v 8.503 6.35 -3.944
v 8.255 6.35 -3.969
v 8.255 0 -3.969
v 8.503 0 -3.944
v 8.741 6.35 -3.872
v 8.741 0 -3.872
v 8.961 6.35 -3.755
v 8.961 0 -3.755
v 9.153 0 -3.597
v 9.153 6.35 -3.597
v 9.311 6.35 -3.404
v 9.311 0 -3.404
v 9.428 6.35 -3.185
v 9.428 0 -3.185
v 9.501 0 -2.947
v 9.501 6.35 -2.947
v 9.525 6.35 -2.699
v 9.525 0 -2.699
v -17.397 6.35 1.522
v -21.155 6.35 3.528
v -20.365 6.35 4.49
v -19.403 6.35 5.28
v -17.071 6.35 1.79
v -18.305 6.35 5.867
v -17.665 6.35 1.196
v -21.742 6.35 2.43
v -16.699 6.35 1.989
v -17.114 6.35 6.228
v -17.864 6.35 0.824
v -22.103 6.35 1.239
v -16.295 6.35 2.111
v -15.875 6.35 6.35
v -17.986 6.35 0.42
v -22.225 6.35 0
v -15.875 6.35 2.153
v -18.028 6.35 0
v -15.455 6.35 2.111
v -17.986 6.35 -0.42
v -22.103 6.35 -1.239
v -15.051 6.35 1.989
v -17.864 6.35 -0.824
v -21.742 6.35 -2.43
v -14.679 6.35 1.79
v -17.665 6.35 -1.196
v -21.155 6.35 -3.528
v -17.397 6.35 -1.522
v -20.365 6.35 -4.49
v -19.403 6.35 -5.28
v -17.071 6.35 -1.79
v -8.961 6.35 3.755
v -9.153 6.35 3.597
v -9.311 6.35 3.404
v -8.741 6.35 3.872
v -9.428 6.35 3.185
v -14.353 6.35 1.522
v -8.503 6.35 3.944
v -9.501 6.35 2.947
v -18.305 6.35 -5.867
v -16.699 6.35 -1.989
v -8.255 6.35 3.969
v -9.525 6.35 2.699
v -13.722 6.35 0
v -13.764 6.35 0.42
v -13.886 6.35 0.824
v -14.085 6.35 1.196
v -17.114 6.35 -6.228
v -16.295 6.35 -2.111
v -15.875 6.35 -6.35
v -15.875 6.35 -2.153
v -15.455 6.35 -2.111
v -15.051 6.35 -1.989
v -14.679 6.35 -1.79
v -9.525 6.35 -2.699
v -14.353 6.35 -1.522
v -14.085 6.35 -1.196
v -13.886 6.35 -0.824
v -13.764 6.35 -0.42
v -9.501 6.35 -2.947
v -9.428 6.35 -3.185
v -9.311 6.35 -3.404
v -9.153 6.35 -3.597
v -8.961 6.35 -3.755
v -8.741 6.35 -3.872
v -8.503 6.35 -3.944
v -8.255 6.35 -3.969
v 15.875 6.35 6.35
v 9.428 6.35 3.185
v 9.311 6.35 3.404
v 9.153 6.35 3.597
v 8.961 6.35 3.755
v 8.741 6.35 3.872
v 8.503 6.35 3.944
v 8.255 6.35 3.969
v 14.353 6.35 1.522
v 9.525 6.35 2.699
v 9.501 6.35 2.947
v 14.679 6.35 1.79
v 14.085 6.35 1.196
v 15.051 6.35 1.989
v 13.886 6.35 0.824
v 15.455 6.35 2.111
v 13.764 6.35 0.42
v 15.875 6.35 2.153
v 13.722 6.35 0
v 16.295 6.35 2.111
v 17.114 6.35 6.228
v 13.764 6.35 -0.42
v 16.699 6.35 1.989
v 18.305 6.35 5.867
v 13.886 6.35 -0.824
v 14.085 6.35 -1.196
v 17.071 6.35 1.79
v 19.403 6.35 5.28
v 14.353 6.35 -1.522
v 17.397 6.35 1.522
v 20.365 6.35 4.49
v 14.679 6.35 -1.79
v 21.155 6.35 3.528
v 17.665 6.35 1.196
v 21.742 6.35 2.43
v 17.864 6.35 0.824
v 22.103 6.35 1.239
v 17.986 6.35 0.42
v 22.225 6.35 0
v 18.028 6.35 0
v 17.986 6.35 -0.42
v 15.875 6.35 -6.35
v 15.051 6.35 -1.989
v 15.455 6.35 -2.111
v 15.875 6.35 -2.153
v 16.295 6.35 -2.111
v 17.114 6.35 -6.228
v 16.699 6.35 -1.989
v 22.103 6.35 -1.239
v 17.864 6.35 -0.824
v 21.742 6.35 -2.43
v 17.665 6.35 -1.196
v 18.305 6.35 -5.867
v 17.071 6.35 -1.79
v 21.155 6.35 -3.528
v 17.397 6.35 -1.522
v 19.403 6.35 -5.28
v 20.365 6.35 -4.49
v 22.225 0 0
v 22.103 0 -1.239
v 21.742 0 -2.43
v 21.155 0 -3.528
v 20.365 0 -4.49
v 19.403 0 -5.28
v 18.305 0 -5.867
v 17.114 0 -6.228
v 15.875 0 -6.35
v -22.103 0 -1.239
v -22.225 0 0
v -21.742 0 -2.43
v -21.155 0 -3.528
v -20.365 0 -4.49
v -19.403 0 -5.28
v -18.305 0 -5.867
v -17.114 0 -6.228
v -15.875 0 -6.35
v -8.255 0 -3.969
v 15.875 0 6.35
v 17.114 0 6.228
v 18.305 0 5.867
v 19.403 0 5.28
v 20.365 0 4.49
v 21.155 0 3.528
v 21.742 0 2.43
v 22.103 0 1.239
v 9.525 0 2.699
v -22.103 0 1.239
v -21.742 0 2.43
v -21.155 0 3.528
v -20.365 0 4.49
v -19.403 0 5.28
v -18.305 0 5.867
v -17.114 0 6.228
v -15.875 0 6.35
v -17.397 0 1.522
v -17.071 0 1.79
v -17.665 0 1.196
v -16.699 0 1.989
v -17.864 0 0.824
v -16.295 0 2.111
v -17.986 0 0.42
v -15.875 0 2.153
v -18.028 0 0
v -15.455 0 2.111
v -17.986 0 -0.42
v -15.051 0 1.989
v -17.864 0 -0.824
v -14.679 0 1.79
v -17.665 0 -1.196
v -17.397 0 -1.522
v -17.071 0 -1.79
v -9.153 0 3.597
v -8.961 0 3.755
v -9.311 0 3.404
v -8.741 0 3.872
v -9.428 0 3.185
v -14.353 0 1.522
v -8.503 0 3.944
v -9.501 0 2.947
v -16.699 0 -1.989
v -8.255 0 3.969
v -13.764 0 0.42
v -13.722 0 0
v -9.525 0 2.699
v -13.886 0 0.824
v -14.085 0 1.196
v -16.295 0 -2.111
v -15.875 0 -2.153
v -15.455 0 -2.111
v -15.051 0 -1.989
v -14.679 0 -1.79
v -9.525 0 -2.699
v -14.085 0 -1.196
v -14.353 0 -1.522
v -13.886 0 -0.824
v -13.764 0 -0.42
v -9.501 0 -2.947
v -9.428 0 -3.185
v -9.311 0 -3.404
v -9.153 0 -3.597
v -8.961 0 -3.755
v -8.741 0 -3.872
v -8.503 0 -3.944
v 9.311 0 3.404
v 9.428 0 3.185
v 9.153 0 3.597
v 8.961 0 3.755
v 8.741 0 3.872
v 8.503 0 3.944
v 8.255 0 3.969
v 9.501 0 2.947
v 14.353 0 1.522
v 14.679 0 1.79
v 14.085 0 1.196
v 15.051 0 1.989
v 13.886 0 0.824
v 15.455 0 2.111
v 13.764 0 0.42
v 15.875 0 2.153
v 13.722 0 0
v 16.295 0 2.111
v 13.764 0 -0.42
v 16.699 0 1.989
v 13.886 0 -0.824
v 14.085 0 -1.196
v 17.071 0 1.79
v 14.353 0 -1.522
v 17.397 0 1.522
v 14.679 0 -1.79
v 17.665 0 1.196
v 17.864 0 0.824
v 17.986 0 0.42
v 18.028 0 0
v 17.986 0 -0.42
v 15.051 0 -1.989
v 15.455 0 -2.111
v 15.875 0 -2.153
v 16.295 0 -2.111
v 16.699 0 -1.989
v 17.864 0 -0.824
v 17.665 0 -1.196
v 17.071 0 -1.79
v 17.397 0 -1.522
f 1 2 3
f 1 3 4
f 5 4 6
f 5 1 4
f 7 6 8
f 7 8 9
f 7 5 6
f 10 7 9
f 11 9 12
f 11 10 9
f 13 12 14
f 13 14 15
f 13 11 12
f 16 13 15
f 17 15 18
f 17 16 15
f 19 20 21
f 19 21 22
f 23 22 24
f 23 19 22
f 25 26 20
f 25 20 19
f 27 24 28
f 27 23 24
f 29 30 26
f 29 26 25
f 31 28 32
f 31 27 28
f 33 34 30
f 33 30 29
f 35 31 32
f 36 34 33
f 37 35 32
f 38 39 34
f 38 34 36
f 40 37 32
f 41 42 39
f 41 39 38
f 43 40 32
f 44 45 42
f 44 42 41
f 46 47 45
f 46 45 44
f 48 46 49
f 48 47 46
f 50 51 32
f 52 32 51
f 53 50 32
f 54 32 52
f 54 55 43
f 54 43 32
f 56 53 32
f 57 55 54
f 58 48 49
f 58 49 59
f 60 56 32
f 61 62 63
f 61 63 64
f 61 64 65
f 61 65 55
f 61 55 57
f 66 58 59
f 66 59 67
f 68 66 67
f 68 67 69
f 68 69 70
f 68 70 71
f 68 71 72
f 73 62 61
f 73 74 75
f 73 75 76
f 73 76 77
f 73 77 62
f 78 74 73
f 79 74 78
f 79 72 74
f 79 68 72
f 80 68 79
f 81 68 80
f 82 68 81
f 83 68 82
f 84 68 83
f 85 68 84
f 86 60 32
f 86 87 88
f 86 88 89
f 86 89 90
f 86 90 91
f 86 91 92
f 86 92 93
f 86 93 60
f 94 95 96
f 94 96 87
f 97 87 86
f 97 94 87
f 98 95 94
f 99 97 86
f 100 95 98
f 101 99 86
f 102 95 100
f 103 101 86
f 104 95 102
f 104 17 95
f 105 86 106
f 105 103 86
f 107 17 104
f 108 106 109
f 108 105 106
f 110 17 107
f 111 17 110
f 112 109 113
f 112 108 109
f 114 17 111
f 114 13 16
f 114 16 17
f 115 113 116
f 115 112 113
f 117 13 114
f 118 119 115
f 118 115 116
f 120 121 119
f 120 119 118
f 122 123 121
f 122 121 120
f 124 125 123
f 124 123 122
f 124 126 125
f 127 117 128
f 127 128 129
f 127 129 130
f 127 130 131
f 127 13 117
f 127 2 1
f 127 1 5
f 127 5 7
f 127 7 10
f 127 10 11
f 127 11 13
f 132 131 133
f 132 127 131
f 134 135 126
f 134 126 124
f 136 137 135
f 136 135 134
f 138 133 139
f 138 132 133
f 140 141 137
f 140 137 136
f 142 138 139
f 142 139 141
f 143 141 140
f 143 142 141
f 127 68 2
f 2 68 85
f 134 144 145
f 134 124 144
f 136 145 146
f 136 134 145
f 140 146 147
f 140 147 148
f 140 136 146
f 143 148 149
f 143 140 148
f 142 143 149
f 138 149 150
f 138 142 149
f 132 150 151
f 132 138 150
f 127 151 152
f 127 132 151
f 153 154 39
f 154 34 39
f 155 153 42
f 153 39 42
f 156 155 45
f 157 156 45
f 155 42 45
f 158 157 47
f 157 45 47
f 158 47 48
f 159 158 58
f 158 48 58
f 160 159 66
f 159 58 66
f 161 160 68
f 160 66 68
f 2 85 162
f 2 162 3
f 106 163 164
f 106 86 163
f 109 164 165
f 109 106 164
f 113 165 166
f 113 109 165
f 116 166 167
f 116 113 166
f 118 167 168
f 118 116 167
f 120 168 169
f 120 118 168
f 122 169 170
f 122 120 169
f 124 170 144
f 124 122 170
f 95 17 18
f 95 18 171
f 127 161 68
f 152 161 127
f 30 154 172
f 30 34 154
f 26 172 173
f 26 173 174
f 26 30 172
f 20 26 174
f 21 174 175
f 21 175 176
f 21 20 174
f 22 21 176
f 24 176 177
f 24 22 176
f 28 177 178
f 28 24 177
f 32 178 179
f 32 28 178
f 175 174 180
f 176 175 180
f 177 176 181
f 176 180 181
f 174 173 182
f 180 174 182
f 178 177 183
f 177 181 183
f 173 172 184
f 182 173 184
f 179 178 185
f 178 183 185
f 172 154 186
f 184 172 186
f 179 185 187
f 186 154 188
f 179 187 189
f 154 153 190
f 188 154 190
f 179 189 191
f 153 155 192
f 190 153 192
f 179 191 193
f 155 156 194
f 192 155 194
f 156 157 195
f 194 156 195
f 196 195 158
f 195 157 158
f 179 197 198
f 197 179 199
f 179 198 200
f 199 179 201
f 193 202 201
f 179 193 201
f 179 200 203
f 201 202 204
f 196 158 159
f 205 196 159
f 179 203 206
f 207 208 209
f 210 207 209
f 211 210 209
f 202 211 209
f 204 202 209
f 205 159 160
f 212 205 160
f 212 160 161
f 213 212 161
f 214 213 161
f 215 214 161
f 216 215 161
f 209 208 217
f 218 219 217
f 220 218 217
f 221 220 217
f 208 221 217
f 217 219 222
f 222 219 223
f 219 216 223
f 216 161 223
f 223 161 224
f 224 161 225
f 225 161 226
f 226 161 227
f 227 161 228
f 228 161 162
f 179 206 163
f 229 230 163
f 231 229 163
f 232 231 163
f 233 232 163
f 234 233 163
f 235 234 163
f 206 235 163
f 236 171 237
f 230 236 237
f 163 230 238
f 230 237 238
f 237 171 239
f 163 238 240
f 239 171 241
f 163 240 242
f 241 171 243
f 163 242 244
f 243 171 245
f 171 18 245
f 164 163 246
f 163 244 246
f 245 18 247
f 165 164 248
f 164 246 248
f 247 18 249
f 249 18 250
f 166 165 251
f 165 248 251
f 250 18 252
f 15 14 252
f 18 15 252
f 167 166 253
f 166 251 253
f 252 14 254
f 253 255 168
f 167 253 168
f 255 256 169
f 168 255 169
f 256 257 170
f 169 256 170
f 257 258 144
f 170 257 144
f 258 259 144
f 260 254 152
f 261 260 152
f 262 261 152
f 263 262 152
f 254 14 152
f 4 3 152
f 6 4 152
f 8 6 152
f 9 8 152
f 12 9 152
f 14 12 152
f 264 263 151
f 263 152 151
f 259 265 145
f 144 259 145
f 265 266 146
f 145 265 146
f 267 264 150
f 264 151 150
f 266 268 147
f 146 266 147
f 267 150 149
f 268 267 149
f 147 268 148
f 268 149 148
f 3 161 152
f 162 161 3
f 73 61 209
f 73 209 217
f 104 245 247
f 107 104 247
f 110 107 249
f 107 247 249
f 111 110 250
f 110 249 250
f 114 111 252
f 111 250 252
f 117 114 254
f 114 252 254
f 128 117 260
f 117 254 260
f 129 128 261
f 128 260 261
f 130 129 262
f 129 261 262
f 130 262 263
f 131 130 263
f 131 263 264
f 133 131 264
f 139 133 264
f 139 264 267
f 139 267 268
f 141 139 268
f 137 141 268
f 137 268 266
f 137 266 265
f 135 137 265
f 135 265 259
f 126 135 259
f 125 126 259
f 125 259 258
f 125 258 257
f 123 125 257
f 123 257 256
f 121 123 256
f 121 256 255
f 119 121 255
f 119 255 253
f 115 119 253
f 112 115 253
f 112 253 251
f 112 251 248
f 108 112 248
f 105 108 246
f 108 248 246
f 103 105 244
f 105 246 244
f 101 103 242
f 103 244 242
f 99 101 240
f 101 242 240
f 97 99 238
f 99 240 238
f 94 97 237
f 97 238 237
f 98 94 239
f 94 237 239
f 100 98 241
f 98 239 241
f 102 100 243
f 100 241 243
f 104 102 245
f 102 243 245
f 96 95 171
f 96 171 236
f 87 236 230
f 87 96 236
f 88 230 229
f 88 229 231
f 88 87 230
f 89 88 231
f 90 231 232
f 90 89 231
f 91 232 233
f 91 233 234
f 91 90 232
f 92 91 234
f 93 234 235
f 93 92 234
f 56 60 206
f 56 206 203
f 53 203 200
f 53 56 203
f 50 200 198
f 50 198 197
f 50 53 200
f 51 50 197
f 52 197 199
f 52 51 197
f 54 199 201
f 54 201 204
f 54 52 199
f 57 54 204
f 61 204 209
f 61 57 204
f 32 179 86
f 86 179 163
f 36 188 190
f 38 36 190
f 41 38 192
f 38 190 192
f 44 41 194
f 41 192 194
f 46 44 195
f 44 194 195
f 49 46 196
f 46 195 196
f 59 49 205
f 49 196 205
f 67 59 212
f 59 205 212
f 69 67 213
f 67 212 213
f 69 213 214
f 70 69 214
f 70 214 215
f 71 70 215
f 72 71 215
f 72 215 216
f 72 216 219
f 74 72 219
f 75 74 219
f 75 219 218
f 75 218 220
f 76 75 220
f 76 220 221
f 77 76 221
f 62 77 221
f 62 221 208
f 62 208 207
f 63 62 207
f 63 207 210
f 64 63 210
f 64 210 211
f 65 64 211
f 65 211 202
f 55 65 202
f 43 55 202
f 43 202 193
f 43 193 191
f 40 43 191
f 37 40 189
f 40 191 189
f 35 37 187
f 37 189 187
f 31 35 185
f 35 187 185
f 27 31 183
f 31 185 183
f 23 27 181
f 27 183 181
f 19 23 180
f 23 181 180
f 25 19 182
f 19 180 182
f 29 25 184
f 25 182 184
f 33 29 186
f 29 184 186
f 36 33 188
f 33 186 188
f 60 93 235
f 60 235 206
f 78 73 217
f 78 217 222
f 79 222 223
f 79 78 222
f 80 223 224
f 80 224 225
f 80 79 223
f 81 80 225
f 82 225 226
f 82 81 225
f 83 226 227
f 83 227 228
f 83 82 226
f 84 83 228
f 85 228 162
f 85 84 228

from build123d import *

# Parameters (mm, degrees)
SKETCH1_W                    = 44.45
SKETCH1_H                    = 12.7
BOSS_EXTRUDE4_DEPTH          = 6.35
FILLET3_R                    = 6.35
F_18_0_1695_DIAMETER_HOLE2_D = 4.3053
CUT_EXTRUDE1_DEPTH           = 6.35


with BuildPart() as part:
    # Sketch1 → Boss-Extrude4 (new body)
    with BuildSketch(Plane(origin=(0, 0, 0), x_dir=(1, 0, 0), z_dir=(0, 1, 0))):
        Rectangle(SKETCH1_W, SKETCH1_H)
    extrude(amount=BOSS_EXTRUDE4_DEPTH)

    # Fillet3
    fillet3_edges = [part.edges().sort_by_distance(p)[0] for p in [
        (22.225, 3.175, -6.35),
        (22.225, 3.175, 6.35),
        (-22.225, 3.175, -6.35),
        (-22.225, 3.175, 6.35),
    ]]
    fillet(fillet3_edges, radius=FILLET3_R - 0.0001)  # a hair under: the kernel refuses the full size

    # #18 (0.1695) Diameter Hole2 (through all)
    with Locations(Plane(origin=(0, 6.35, 0), x_dir=(1, 0, 0), z_dir=(0, 1, 0))):
        with Locations((-15.875, 0), (15.875, 0)):
            Hole(F_18_0_1695_DIAMETER_HOLE2_D / 2)

    # Sketch10 → Cut-Extrude1 (cut)
    with BuildSketch(Plane(origin=(0, 6.35, 0), x_dir=(1, 0, 0), z_dir=(0, 1, 0))):
        with BuildLine():
            Line((-8.255, 3.96875), (8.255, 3.96875))
            ThreePointArc((8.255, 3.96875), (9.153025612, 3.596775612), (9.525, 2.69875))
            Line((9.525, 2.69875), (9.525, -2.69875))
            ThreePointArc((9.525, -2.69875), (9.153025612, -3.596775612), (8.255, -3.96875))
            Line((8.255, -3.96875), (-8.255, -3.96875))
            ThreePointArc((-8.255, -3.96875), (-9.153025612, -3.596775612), (-9.525, -2.69875))
            Line((-9.525, -2.69875), (-9.525, 2.69875))
            ThreePointArc((-9.525, 2.69875), (-9.153025612, 3.596775612), (-8.255, 3.96875))
        make_face()
    extrude(amount=-CUT_EXTRUDE1_DEPTH, mode=Mode.SUBTRACT)


solid = part.part
